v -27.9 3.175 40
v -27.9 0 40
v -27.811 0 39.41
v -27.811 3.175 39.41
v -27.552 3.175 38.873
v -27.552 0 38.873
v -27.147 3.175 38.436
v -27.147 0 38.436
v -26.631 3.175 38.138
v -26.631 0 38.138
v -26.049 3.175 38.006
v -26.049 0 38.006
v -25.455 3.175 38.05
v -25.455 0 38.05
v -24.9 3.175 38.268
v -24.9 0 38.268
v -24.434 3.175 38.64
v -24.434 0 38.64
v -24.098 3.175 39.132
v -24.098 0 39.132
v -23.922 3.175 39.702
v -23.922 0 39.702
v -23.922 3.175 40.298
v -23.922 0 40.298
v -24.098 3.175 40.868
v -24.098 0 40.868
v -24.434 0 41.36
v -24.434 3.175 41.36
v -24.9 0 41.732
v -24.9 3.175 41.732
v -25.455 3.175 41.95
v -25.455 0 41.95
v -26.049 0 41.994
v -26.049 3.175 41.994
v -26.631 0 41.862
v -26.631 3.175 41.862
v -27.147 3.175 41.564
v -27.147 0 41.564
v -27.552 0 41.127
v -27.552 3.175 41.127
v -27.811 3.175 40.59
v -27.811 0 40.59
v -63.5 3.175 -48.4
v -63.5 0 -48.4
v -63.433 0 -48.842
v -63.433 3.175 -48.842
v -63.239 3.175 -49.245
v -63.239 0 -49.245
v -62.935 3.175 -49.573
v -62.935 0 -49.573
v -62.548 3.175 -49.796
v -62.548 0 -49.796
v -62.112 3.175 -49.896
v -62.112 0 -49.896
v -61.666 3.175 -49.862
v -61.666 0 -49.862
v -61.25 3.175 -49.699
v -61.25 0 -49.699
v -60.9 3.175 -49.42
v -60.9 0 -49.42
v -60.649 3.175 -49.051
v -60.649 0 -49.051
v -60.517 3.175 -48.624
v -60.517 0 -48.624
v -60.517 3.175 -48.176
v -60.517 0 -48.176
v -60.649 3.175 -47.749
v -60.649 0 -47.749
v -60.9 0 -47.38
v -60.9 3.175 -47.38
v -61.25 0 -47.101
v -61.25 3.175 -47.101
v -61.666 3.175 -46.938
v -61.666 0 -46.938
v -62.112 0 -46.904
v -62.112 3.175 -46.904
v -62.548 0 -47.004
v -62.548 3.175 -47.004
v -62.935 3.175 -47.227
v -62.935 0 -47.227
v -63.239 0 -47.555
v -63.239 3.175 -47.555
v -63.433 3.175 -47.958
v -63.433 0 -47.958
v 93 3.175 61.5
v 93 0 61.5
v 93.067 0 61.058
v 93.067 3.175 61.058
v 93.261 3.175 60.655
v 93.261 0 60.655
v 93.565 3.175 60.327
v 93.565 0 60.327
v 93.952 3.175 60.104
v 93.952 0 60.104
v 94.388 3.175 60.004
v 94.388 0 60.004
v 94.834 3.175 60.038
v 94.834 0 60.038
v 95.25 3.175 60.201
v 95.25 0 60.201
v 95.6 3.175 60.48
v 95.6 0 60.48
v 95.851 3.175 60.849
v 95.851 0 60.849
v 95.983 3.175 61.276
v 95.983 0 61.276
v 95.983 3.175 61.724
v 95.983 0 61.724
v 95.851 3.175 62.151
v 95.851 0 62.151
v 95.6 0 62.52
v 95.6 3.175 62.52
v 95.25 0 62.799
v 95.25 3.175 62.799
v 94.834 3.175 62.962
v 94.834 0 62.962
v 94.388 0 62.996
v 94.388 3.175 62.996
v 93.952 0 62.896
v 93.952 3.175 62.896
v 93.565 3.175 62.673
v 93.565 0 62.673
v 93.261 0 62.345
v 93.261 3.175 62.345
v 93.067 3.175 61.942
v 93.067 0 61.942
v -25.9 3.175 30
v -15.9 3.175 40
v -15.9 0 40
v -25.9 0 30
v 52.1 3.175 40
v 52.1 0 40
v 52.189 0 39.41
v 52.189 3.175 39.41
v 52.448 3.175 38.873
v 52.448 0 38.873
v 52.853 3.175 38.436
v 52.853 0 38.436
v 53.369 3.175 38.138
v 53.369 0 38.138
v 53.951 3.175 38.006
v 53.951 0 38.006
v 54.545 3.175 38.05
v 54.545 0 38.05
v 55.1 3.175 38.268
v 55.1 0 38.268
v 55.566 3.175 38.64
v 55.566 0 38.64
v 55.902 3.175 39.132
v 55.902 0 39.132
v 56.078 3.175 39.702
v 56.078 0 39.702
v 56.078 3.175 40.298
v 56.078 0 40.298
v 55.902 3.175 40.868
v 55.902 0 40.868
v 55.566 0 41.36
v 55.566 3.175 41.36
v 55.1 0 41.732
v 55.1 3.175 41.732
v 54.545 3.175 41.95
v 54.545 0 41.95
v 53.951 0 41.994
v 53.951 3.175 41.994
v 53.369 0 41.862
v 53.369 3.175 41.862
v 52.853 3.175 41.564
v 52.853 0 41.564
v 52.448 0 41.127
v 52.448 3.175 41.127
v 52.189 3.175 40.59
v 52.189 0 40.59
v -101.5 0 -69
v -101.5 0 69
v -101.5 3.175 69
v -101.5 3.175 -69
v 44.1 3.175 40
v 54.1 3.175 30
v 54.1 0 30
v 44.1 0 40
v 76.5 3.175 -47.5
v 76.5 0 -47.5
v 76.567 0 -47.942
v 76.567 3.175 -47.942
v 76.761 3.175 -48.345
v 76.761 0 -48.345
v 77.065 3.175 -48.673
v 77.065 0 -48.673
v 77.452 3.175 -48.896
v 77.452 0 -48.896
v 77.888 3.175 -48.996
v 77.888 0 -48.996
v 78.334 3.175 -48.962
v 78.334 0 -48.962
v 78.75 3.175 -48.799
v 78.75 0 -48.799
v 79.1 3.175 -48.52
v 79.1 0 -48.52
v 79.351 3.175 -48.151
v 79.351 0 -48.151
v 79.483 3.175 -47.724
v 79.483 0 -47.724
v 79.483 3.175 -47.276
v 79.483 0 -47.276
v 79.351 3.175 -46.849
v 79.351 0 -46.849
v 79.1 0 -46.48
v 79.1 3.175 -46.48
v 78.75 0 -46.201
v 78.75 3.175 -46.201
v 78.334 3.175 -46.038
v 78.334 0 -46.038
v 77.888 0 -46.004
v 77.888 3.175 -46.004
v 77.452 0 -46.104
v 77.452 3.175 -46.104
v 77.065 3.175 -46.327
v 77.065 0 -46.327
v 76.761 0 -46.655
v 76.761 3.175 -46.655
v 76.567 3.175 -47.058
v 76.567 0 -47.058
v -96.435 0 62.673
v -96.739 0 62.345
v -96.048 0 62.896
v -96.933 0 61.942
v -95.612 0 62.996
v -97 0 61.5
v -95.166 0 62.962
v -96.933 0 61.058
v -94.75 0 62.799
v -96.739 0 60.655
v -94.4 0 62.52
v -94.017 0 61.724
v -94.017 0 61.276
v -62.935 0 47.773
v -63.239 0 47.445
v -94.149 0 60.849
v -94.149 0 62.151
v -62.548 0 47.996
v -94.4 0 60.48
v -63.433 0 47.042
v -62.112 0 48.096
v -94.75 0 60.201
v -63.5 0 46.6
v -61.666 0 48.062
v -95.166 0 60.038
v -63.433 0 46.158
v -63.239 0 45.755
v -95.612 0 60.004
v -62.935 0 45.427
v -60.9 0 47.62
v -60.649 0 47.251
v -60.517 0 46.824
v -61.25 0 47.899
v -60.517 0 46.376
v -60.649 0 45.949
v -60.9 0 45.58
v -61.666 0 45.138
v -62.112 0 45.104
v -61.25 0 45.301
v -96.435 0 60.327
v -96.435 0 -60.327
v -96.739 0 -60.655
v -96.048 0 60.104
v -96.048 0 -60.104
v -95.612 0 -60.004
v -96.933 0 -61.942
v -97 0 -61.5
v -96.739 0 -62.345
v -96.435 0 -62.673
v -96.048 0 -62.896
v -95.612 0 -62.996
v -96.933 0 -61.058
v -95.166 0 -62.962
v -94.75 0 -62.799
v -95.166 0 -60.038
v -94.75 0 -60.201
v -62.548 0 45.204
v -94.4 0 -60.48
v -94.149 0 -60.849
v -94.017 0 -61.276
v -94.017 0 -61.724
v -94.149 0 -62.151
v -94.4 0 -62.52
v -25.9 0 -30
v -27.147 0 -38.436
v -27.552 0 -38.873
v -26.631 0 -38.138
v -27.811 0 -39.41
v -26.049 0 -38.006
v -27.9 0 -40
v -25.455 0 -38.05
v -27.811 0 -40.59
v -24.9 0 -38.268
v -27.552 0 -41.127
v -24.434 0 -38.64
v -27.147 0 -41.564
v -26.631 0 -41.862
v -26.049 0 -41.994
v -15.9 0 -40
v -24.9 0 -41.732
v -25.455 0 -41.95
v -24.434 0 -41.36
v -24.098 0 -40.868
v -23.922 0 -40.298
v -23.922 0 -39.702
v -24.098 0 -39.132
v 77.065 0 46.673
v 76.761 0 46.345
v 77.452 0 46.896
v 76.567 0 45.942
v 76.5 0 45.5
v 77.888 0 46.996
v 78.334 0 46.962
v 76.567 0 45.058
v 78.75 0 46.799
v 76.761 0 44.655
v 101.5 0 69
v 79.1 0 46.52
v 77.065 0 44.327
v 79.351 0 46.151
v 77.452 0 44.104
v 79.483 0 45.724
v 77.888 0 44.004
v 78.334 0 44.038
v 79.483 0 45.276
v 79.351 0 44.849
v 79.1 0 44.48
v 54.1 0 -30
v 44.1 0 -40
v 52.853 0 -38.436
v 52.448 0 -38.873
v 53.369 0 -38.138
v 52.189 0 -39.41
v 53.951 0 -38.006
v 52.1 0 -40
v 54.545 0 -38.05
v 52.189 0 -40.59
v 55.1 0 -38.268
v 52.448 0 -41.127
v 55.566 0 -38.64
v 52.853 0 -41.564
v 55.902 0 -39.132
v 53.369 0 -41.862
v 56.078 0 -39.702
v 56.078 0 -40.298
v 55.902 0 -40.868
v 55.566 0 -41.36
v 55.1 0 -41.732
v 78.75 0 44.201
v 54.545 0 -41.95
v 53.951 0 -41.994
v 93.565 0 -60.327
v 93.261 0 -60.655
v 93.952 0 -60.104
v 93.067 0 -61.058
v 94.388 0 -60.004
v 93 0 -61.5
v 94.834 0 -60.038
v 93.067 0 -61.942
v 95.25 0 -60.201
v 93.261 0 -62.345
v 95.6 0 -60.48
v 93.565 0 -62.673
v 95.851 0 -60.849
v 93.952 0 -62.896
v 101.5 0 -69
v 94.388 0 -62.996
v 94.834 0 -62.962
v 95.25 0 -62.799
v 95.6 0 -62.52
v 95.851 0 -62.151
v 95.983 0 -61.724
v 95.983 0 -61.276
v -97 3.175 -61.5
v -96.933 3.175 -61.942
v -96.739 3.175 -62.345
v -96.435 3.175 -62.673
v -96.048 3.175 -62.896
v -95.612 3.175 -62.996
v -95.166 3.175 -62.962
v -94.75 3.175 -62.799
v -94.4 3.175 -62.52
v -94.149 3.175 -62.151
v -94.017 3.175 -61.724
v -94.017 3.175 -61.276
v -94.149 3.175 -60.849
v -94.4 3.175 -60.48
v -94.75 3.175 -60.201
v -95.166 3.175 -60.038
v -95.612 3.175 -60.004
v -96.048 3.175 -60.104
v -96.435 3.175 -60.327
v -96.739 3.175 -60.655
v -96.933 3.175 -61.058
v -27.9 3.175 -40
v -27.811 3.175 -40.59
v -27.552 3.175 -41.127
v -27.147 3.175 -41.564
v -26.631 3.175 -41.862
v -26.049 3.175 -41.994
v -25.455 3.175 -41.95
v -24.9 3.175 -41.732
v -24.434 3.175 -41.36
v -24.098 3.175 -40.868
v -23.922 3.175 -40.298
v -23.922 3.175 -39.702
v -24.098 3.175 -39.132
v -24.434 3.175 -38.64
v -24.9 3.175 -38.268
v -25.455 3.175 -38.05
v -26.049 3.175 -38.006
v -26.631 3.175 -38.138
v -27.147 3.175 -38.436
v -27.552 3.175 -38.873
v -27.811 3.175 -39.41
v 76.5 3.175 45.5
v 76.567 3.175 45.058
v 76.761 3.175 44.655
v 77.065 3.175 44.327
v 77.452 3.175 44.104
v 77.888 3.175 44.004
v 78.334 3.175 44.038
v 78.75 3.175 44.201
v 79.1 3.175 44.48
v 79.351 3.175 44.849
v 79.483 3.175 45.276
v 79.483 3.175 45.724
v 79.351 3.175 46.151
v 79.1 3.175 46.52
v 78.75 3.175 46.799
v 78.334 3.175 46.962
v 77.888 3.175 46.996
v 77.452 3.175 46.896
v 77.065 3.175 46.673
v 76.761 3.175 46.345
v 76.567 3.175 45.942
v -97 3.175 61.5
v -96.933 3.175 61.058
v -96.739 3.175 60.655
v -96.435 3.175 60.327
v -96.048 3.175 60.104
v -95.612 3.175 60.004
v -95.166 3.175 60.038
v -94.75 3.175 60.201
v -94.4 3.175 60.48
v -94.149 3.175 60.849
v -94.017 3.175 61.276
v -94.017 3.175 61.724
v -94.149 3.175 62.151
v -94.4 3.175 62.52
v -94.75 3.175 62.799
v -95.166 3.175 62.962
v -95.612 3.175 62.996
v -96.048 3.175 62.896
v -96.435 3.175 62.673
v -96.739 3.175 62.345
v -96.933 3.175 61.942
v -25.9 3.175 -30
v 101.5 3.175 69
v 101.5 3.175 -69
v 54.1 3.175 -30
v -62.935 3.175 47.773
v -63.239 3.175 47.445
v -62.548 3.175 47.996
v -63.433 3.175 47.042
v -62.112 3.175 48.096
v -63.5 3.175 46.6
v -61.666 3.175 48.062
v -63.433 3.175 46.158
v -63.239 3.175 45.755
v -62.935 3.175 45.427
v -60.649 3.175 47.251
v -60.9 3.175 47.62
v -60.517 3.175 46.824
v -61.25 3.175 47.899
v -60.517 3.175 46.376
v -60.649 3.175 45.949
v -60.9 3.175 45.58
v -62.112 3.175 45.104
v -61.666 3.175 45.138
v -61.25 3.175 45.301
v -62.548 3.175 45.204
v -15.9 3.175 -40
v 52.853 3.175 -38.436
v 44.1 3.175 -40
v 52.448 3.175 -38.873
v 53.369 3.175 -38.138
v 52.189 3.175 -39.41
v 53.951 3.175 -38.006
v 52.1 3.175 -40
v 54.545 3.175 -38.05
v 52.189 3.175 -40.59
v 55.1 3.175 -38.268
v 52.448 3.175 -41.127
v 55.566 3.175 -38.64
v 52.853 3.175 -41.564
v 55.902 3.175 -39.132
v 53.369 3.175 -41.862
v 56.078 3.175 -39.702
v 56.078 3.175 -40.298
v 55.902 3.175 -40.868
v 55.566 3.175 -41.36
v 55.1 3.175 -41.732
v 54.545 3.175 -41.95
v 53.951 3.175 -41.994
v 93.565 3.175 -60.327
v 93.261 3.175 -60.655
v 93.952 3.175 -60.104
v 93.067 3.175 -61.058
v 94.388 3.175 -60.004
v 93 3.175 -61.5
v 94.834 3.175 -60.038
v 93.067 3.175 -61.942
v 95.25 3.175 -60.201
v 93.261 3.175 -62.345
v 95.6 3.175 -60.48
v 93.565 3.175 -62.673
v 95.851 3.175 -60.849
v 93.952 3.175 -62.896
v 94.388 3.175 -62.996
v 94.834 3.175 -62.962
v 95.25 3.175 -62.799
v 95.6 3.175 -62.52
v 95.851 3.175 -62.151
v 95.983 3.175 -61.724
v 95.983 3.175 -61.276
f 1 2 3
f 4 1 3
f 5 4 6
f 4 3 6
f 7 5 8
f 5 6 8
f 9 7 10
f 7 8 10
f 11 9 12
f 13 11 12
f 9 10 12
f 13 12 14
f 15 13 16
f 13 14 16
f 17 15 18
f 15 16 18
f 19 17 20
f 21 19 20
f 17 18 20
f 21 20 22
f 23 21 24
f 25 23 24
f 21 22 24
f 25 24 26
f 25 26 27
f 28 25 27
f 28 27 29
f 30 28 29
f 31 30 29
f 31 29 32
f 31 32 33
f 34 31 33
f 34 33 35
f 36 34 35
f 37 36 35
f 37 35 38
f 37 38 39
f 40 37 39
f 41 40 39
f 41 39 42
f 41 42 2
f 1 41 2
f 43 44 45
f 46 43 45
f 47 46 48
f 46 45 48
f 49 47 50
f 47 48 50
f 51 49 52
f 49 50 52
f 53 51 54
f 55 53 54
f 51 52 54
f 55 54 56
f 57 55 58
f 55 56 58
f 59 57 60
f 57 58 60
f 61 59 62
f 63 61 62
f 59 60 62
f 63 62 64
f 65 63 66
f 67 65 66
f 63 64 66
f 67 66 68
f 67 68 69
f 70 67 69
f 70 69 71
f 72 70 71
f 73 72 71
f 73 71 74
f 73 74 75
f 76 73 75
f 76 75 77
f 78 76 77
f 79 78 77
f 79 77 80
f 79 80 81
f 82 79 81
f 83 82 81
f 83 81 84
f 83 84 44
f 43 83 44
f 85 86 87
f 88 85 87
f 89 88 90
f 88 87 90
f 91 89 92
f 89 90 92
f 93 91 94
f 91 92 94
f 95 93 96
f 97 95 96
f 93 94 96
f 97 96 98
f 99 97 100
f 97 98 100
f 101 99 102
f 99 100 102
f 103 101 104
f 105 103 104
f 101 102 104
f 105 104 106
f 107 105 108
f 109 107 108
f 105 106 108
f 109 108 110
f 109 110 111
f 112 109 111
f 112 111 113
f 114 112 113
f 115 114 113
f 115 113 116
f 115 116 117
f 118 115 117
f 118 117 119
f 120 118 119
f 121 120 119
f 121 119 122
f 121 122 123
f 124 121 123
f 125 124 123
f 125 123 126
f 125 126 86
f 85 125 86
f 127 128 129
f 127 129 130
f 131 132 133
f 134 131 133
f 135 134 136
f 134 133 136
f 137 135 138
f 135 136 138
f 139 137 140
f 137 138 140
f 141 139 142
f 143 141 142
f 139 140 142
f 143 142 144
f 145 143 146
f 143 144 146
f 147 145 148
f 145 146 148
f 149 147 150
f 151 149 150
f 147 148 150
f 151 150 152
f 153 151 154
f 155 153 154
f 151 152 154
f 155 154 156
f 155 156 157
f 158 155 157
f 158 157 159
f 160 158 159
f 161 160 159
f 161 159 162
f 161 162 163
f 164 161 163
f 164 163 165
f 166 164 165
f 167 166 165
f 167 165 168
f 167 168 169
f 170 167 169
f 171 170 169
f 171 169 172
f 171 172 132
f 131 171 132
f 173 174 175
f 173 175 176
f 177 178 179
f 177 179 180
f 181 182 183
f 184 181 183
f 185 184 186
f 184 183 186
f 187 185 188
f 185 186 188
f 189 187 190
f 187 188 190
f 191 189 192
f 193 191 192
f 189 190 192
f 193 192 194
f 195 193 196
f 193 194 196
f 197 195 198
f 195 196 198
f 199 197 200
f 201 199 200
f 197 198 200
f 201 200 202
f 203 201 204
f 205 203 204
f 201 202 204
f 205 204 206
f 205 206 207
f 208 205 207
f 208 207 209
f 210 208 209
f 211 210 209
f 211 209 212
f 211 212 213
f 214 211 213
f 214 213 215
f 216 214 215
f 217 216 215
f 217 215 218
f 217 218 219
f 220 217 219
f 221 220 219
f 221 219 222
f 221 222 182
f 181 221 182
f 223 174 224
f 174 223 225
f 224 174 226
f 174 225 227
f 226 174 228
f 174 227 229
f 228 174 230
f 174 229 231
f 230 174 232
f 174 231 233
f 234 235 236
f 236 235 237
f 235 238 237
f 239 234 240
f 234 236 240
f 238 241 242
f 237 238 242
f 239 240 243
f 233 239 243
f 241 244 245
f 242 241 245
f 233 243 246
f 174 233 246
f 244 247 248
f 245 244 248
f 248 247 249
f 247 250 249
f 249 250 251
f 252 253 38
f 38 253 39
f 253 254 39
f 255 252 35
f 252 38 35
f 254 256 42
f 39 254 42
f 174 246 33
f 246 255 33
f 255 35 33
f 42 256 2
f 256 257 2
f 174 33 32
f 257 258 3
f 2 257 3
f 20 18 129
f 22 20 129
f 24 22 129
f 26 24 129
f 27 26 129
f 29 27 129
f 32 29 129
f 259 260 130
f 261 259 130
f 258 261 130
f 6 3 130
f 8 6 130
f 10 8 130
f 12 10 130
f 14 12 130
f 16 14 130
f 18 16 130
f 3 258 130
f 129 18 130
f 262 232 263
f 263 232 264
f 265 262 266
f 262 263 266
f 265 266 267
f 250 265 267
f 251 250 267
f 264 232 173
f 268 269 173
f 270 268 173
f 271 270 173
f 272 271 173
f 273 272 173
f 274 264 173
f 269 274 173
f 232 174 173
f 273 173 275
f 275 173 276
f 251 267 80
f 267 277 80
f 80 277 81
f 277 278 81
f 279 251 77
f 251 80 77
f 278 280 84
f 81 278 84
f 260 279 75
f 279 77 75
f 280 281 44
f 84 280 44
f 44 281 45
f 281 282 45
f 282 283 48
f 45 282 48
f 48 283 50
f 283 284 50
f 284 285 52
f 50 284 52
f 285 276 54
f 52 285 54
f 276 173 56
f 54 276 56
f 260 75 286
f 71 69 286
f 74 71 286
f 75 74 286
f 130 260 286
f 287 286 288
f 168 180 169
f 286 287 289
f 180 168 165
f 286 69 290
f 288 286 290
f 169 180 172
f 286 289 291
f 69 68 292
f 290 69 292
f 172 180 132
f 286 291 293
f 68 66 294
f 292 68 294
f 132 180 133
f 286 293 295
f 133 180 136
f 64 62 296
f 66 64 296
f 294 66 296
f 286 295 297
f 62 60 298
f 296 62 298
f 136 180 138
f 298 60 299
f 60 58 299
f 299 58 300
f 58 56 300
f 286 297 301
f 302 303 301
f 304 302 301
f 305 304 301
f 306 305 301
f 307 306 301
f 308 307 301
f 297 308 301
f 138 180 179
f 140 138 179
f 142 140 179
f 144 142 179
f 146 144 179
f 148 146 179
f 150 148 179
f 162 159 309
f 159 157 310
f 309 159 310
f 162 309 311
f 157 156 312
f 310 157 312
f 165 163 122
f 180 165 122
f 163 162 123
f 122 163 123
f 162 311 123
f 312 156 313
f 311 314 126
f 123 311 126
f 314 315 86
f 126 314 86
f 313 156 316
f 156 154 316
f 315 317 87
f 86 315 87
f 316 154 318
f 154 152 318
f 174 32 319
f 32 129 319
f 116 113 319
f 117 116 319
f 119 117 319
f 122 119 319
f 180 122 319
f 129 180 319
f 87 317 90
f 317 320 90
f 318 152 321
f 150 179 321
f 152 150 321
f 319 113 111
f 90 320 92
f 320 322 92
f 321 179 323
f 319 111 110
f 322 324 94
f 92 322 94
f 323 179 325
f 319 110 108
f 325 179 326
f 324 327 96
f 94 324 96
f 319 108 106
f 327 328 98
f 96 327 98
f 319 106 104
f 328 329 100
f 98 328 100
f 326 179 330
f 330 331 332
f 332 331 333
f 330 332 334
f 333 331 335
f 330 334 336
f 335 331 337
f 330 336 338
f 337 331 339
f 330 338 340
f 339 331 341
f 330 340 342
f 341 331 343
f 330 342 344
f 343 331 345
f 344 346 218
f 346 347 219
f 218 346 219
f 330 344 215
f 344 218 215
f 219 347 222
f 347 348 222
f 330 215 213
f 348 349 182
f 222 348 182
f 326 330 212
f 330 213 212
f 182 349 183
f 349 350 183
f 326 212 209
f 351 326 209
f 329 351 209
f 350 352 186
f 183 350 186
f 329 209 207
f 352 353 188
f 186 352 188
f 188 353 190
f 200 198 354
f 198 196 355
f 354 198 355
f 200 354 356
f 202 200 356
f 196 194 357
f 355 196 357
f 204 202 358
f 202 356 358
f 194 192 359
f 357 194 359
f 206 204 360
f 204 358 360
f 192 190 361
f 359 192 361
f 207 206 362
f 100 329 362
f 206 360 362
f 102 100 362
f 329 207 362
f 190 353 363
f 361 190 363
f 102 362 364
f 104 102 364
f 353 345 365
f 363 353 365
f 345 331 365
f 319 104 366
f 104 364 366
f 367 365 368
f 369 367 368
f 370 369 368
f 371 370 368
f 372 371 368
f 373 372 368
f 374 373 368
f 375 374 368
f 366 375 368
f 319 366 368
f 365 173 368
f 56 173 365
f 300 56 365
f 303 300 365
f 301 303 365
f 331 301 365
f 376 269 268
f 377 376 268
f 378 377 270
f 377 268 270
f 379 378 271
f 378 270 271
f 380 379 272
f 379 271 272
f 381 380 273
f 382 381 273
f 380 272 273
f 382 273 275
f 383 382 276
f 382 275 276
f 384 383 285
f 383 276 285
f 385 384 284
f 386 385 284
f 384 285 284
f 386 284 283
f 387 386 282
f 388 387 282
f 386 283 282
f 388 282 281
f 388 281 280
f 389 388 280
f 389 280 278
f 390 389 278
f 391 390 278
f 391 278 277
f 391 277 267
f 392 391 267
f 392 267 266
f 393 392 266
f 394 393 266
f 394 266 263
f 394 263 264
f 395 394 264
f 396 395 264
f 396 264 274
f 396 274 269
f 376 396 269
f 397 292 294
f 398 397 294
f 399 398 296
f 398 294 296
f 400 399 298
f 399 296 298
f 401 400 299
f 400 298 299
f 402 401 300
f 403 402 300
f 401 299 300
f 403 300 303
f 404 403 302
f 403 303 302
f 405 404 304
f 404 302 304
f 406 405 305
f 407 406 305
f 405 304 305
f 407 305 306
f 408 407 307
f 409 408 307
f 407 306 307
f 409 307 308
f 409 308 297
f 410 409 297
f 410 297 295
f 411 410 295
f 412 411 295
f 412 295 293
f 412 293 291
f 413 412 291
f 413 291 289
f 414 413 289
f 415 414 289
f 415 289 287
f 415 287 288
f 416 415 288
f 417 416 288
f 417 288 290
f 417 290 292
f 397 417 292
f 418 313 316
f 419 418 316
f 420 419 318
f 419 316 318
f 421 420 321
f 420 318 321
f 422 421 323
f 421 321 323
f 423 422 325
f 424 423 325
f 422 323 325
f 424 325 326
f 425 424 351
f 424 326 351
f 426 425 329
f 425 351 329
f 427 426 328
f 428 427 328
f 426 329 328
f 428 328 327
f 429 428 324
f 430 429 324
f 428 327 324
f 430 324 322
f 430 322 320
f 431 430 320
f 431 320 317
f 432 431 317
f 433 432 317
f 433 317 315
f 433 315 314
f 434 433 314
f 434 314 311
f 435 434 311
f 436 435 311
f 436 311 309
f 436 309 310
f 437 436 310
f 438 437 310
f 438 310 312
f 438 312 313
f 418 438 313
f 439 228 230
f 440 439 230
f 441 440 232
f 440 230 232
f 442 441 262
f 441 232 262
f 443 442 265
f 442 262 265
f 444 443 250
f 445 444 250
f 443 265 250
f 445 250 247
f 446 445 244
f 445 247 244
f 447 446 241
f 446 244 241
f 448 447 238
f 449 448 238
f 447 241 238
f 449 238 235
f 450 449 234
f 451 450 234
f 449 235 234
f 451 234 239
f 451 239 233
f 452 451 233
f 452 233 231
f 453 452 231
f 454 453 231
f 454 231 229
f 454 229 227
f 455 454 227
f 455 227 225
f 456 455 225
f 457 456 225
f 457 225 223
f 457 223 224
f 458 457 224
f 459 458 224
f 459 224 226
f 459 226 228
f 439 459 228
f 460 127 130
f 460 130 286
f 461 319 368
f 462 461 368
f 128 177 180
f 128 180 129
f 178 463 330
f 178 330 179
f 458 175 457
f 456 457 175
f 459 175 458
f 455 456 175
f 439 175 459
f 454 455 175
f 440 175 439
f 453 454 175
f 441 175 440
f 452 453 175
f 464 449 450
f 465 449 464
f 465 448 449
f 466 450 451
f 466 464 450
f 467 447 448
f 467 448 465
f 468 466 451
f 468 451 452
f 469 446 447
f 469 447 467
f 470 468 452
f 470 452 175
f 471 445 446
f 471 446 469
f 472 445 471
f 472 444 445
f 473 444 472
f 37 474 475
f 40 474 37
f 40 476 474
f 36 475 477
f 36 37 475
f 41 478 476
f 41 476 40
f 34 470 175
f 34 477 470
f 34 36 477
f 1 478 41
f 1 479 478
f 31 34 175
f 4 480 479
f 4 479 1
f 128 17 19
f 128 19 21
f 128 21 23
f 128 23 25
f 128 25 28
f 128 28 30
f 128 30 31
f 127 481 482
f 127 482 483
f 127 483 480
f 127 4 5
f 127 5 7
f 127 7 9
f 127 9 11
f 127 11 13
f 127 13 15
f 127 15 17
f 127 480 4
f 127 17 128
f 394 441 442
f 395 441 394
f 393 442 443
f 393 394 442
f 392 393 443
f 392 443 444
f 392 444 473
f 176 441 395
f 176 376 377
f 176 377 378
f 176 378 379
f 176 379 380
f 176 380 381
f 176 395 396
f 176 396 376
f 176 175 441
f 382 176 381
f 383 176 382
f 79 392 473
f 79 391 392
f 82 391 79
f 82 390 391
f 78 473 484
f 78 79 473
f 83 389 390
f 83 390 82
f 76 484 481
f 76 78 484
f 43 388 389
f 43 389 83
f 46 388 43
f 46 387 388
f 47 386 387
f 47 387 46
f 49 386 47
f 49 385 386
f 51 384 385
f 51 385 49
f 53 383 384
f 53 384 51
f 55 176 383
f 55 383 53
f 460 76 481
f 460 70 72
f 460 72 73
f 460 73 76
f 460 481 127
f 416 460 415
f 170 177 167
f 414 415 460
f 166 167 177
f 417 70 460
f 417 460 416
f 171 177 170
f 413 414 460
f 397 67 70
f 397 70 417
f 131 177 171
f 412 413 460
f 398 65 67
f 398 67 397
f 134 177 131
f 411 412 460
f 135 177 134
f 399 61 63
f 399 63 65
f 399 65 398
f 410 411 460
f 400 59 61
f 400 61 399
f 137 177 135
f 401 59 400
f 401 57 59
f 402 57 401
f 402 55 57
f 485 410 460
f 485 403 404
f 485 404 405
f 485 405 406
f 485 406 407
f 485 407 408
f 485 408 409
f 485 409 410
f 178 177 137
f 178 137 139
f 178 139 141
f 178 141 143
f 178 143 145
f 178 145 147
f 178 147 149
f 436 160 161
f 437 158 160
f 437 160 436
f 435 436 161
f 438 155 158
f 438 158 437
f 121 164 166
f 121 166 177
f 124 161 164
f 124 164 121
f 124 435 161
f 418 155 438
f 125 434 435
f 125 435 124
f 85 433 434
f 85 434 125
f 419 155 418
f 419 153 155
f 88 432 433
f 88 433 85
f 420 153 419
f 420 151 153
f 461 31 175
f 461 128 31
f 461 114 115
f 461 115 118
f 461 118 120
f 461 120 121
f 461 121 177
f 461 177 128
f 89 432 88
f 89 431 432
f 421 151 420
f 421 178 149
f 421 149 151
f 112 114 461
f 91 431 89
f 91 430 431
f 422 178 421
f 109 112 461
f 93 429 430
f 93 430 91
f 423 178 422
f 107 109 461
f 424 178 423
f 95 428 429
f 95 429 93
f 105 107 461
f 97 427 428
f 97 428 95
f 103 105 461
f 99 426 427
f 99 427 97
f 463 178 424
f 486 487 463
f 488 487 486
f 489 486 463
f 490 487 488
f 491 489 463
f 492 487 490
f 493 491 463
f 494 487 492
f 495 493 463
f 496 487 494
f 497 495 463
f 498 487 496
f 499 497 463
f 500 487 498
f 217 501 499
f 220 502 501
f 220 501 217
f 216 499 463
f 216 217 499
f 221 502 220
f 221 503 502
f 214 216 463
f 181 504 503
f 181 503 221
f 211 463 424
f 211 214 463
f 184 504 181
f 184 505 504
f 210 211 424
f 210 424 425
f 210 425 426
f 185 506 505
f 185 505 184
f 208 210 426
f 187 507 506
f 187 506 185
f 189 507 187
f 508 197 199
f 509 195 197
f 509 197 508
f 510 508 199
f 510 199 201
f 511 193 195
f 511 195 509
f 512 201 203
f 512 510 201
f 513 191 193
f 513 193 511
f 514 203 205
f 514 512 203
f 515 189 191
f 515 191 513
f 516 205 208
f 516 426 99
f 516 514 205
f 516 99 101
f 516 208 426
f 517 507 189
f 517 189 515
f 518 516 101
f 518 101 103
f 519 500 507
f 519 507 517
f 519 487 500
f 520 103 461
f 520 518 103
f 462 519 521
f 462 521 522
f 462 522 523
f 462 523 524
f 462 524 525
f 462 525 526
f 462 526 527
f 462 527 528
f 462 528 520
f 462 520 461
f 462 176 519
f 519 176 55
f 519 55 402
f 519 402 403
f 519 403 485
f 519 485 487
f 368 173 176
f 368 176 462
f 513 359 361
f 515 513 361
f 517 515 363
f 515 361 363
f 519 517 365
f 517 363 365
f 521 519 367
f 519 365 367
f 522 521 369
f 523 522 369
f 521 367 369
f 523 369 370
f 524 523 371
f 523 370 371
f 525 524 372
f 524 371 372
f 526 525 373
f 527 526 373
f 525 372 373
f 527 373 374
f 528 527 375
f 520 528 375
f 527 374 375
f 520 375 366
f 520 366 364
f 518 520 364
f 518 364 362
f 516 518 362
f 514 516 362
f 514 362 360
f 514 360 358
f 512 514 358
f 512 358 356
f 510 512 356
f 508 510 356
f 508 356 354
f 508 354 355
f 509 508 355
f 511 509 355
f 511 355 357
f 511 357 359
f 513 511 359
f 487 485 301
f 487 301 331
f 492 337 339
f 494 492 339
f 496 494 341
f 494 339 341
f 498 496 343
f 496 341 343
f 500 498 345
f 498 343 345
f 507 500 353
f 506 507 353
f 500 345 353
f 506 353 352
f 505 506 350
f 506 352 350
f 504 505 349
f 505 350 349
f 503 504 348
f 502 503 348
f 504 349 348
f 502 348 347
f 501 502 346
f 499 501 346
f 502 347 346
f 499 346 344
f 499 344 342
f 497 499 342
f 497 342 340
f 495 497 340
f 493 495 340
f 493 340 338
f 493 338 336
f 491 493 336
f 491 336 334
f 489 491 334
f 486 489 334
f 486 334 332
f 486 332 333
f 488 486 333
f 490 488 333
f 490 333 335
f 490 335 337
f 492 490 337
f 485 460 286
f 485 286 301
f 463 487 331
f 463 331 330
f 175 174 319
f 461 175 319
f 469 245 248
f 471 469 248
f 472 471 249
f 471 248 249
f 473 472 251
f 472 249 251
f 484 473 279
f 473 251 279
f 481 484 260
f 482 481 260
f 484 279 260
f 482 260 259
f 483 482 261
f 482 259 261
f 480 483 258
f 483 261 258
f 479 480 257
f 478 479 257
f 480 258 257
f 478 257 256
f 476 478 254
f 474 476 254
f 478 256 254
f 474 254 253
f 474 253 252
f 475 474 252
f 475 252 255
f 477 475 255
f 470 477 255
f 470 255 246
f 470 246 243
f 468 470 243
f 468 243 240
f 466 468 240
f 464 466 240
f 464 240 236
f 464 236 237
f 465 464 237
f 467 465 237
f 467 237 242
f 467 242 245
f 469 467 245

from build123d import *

# Parameters (mm, degrees)
SKETCH1_W             = 203
SKETCH1_H             = 138
BOSS_EXTRUDE1_DEPTH   = 3.175
F_3_0MM_DOWEL_HOLE1_D = 3
F_4_0MM_DOWEL_HOLE1_D = 4
CUT_EXTRUDE1_DEPTH    = 123.773493169


with BuildPart() as part:
    # Sketch1 → Boss-Extrude1 (new body)
    with BuildSketch(Plane(origin=(0, 0, 0), x_dir=(1, 0, 0), z_dir=(0, 1, 0))):
        Rectangle(SKETCH1_W, SKETCH1_H)
    extrude(amount=BOSS_EXTRUDE1_DEPTH)

    # Ø3.0mm Dowel Hole1 (through all)
    with Locations(Plane(origin=(0, 3.175, 0), x_dir=(1, 0, 0), z_dir=(0, 1, 0))):
        with Locations((-95.5, 61.5), (94.5, 61.5), (94.5, -61.5), (-95.5, -61.5), (-62, -46.6), (78, -45.5), (78, 47.5), (-62, 48.4)):
            Hole(F_3_0MM_DOWEL_HOLE1_D / 2)

    # Ø4.0mm Dowel Hole1 (through all)
    with Locations(Plane(origin=(0, 3.175, 0), x_dir=(1, 0, 0), z_dir=(0, 1, 0))):
        with Locations((-25.9, 40), (54.1, 40), (54.1, -40), (-25.9, -40)):
            Hole(F_4_0MM_DOWEL_HOLE1_D / 2)

    # Sketch7 → Cut-Extrude1 (cut, through all)
    with BuildSketch(Plane(origin=(0, 3.175, 0), x_dir=(1, 0, 0), z_dir=(0, 1, 0))):
        Polygon((-25.9, 30), (-15.9, 40), (44.1, 40), (54.1, 30), (54.1, -30), (44.1, -40), (-15.9, -40), (-25.9, -30), align=None)
    extrude(amount=-CUT_EXTRUDE1_DEPTH, mode=Mode.SUBTRACT)


solid = part.part
